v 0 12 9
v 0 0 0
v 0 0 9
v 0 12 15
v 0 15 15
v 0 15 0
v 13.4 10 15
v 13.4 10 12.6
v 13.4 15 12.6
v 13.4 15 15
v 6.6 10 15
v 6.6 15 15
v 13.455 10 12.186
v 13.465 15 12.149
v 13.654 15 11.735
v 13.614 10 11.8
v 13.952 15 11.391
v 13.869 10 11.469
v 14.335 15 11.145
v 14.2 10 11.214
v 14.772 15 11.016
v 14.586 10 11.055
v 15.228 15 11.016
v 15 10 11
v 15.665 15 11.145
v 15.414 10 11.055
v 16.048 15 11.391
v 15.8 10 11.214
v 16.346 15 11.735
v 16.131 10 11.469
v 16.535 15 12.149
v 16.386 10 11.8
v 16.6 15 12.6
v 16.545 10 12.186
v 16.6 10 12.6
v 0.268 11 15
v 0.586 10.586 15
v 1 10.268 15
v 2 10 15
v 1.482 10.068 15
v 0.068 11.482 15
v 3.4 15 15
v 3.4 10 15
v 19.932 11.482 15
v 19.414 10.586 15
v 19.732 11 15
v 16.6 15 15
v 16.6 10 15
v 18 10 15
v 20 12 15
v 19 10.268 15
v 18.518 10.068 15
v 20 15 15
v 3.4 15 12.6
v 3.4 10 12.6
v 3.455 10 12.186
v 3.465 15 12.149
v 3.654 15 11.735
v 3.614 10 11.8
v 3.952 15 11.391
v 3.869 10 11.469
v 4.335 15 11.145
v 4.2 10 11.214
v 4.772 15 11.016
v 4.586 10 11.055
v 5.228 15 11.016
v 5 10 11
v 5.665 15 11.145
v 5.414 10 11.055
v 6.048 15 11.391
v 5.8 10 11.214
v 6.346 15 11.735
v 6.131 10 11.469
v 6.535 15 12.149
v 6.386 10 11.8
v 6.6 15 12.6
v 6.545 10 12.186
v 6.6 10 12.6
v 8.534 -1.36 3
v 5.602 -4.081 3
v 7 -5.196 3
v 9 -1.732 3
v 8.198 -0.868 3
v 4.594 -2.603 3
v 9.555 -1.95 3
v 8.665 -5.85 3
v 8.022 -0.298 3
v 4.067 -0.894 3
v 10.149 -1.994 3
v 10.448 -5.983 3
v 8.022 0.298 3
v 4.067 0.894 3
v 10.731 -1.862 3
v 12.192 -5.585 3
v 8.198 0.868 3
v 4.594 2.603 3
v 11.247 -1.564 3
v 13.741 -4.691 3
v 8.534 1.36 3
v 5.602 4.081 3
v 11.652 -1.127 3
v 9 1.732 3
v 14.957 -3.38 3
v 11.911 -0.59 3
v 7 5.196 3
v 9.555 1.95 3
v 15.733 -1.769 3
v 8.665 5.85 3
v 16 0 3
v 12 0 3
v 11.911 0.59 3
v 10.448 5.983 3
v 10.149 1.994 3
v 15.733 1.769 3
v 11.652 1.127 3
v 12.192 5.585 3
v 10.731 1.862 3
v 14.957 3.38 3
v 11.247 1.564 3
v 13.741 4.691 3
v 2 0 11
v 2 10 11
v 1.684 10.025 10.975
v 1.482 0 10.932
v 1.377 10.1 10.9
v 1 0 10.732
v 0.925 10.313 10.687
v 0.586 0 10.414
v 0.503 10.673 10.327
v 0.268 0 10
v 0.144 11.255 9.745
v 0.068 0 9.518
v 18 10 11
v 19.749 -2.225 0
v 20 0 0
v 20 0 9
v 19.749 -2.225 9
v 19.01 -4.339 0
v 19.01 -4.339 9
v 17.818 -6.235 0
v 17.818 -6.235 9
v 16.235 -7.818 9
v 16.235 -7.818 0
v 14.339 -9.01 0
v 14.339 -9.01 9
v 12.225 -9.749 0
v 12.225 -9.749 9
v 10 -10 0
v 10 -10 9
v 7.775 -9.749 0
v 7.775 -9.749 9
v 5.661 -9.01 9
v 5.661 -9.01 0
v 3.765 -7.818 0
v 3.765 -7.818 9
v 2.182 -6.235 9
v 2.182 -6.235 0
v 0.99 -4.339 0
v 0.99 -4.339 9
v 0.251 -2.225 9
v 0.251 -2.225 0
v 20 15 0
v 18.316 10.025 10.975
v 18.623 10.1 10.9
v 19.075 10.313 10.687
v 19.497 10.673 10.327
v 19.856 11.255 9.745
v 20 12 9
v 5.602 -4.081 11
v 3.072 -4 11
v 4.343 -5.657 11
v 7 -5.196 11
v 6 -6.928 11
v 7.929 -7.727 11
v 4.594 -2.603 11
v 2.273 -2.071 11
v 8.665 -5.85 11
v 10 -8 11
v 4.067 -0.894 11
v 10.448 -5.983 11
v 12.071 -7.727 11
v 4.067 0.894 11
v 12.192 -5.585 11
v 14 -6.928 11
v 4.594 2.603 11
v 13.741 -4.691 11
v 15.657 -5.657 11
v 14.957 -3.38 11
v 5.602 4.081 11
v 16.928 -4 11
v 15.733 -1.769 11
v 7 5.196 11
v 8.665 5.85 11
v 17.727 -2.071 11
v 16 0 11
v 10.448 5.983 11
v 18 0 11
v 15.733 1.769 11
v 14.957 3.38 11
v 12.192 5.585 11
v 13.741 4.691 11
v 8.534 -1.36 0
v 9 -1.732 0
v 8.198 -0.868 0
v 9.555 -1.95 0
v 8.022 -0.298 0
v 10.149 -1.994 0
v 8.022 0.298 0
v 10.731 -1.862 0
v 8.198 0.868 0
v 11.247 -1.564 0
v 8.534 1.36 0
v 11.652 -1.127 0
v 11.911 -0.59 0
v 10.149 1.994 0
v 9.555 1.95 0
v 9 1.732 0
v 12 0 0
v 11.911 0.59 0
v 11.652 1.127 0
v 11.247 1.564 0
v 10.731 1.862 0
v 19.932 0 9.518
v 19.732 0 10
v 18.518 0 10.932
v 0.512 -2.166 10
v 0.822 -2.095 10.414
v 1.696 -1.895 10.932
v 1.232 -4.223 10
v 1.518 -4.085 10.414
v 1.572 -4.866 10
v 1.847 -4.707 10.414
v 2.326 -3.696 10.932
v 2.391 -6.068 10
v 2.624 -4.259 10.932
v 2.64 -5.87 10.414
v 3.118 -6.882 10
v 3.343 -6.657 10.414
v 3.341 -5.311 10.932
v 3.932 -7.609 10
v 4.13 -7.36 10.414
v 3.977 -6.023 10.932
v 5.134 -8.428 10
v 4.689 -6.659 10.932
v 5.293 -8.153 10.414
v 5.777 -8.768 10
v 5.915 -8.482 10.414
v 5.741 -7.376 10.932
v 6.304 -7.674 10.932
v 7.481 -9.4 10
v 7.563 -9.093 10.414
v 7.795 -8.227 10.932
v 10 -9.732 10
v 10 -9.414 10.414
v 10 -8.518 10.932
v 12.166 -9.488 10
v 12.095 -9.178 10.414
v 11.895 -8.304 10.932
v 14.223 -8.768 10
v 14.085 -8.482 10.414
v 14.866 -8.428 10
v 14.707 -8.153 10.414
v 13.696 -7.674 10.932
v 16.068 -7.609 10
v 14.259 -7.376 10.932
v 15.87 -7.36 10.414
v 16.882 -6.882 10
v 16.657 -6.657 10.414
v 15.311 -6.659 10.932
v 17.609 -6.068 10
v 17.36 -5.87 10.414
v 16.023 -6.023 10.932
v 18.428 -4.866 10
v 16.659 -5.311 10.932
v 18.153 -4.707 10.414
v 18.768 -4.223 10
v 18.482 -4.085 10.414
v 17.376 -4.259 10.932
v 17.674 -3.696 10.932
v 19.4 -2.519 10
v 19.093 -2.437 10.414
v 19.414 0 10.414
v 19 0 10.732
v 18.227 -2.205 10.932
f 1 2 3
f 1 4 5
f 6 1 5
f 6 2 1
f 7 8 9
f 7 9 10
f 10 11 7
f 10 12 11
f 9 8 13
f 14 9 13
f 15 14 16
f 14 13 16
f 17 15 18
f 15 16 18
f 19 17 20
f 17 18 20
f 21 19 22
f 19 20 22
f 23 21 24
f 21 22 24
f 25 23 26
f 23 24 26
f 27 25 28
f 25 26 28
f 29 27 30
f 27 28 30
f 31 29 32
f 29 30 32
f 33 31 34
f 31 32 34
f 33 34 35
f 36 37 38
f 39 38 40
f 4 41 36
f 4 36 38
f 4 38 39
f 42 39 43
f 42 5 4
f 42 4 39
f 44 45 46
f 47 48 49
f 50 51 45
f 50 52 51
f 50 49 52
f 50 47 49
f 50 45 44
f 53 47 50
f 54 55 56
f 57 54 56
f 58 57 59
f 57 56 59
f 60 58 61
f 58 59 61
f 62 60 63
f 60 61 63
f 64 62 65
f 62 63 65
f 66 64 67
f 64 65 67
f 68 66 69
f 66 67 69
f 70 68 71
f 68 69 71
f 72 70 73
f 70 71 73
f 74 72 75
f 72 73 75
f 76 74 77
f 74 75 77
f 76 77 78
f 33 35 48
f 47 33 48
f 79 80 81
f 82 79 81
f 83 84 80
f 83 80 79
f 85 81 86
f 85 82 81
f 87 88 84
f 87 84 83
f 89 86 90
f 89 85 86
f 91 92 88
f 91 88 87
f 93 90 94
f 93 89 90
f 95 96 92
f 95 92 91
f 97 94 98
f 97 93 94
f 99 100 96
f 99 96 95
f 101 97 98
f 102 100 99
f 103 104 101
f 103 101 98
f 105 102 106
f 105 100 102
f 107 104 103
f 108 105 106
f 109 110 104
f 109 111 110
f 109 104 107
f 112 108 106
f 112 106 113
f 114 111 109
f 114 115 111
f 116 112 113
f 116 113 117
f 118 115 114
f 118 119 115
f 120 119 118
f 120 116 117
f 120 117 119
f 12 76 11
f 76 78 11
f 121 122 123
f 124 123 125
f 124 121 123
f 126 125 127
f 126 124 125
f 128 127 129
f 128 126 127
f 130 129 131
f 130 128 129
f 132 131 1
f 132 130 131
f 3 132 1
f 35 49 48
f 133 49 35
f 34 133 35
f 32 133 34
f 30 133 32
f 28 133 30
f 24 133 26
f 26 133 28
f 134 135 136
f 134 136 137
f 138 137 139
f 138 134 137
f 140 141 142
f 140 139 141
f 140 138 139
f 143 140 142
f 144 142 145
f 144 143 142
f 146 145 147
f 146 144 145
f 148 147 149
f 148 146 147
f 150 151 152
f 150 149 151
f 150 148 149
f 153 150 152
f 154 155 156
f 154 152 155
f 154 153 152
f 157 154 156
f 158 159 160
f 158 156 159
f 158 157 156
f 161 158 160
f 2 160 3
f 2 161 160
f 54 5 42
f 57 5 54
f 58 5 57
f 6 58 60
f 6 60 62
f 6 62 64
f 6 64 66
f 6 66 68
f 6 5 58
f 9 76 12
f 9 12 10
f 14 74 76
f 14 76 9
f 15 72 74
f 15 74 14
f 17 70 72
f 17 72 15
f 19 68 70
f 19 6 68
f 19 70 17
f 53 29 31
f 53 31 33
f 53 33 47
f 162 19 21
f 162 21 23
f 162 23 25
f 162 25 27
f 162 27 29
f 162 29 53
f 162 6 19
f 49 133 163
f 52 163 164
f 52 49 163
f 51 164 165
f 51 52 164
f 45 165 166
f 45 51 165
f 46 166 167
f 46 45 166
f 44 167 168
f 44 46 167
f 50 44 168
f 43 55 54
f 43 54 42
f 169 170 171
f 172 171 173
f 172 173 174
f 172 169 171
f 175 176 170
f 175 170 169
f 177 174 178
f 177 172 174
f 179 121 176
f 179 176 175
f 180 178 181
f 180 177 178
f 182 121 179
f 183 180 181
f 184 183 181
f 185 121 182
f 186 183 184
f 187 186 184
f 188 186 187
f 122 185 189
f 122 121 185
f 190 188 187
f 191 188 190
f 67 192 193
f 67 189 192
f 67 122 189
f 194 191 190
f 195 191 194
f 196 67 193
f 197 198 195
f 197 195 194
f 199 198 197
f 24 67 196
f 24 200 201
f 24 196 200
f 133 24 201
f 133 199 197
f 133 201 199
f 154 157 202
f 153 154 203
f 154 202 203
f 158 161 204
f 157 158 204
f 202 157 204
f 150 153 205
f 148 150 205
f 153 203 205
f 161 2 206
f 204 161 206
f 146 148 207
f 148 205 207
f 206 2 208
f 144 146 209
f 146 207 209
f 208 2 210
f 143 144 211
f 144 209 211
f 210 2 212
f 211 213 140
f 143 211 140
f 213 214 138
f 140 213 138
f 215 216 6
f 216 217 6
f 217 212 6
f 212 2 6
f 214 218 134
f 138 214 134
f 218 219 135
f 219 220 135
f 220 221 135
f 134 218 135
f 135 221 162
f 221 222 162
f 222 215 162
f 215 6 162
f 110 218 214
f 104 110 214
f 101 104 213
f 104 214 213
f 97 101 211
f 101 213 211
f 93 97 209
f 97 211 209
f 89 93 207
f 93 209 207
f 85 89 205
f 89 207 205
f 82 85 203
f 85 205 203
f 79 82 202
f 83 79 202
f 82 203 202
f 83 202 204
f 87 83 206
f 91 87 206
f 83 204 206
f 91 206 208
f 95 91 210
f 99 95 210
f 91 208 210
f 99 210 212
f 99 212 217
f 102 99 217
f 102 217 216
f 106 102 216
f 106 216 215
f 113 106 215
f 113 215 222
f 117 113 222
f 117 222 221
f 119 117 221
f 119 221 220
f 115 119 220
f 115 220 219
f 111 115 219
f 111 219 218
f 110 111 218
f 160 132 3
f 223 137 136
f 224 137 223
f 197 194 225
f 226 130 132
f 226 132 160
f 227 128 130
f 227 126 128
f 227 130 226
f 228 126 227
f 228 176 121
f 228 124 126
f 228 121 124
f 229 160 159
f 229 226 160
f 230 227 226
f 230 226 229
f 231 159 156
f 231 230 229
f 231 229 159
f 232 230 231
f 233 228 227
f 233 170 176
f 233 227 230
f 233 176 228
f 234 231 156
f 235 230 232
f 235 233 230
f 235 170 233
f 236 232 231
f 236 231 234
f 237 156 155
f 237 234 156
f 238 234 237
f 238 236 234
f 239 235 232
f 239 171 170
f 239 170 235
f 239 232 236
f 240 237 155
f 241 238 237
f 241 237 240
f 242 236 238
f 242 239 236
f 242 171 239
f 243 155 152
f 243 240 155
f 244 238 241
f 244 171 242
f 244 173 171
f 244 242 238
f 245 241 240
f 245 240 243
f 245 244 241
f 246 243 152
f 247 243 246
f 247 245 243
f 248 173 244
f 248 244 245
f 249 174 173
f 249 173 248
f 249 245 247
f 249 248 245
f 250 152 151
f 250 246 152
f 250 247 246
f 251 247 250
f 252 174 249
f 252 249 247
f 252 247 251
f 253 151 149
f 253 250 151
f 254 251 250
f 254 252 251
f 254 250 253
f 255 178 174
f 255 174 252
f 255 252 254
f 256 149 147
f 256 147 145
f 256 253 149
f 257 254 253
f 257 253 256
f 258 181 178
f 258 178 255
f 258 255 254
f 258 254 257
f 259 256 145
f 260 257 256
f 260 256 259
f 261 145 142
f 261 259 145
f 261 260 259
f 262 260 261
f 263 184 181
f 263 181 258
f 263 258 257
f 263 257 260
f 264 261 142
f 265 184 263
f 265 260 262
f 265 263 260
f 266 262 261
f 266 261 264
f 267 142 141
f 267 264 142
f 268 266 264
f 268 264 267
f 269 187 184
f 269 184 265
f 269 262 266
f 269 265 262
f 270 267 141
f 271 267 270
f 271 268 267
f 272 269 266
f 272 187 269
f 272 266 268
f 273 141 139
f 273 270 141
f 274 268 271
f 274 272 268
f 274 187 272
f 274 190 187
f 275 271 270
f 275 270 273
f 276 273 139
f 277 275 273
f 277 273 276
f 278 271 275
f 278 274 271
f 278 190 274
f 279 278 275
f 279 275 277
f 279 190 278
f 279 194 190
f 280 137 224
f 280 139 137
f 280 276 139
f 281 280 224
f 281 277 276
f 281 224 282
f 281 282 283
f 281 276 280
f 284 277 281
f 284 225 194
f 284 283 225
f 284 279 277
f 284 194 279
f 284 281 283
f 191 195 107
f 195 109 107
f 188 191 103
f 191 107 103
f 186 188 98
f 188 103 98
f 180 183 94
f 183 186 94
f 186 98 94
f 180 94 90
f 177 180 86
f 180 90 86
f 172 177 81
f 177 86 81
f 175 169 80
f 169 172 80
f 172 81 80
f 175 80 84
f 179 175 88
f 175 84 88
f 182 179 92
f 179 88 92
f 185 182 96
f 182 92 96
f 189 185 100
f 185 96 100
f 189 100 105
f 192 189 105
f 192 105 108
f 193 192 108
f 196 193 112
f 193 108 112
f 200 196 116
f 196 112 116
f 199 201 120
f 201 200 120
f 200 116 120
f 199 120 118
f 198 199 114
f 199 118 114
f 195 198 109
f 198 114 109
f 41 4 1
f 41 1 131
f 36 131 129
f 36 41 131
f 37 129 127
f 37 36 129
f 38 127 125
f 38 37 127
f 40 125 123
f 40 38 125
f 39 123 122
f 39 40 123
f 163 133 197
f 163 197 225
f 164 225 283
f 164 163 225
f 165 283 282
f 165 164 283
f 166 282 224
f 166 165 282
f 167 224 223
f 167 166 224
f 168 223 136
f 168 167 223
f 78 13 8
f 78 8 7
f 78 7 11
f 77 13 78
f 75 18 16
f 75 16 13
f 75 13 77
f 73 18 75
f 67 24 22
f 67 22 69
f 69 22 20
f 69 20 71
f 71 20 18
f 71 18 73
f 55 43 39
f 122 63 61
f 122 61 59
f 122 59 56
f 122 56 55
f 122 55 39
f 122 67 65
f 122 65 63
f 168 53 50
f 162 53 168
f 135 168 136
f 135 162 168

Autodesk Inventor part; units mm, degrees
ref_plane "YZ Plane" through (0, 0, 0) normal (1, 0, 0) x (0, 1, 0)
ref_plane "XZ Plane" through (0, 0, 0) normal (0, 1, 0) x (-1, 0, 0)
ref_plane "XY Plane" through (0, 0, 0) normal (0, 0, 1) x (1, 0, 0)
sketch "Sketch1" plane through (0, 0, 0) normal (0, 0, 1) x (1, 0, 0)
  line L0 (20, 0) -> (20, 15)
  line L1 (20, 15) -> (0, 15)
  line L2 (0, 15) -> (0, 0)
  circle A0 centre (10, 0) radius 10
  circle A1 centre (10, 0) radius 2
  line L3 (0, 0) -> (8, 0)
  line L4 (12, 0) -> (20, 0)
  dimension "d3" = 20
  dimension "d4" = 15
  dimension "d5" = 4
extrude "Extrusion1" add sketch "Sketch1" along normal blind 3 contours A0 L2 L1 L0 | L4 A1 L3 A0 | A0 L3 A1 L4
sketch "Sketch3" plane through (0, 0, 3) normal (0, 0, 1) x (1, 0, 0)
  circle A0 centre (10, 0) radius 2 projected
  circle A1 centre (10, 0) radius 6
  line L0 (0, 15) -> (0, 0) projected
  arc A2 (0, 0) -> (20, 0) centre (10, 0) ccw
  line L1 (0, 15) -> (20, 15)
  line L2 (20, 15) -> (20, 0)
  line L3 (0, 0) -> (0, 15)
  dimension "d8" = 12
extrude "Extrusion2" add sketch "Sketch3" along normal blind 8 contours L1 L2 A2 L0
sketch "Sketch4" plane through (0, 0, 11) normal (0, 0, 1) x (1, 0, 0)
  line L0 (0, 15) -> (20, 15)
  line L1 (20, 15) -> (20, 10)
  line L2 (20, 10) -> (0, 10)
  line L3 (0, 10) -> (0, 15)
  line L4 (20, 15) -> (0, 15) projected
  point P0 (0, 0)
  dimension "d11" = 20
  dimension "d12" = 5
extrude "Extrusion3" add sketch "Sketch4" along normal blind 4
sketch "Sketch5" plane through (0, 10, 11) normal (0, -1, 0) x (1, 0, 0)
  circle A0 centre (5, 1.6) radius 1.6
  circle A1 centre (15, 1.6) radius 1.6
  line L0 (0, 0) -> (0, 4) projected
  line L1 (20, 0) -> (20, 4) projected
  line L2 (0, 4) -> (20, 4) projected
  line L3 (20, 0) -> (0, 0) projected
  line L4 (3.4, 1.6) -> (3.4, 4)
  line L5 (13.4, 1.6) -> (13.4, 4)
  line L6 (16.6, 1.6) -> (16.6, 4)
  line L7 (6.6, 1.6) -> (6.6, 4)
  point P0 (0, -11)
  dimension "d15" = 3.2
  dimension "d16" = 3.2
  dimension "d21" = 5
  dimension "d23" = 5
extrude "Extrusion4" cut sketch "Sketch5" against normal through all contours A0 | A0 L4 L2 L7 | A1 | L2 L6 A1 L5
fillet "Fillet2" radius 2 5 edges at (0, 10, 13) (10, -10, 11) (20, 5, 11) (0, 5, 11) (20, 10, 13)
properties part number "clip"
